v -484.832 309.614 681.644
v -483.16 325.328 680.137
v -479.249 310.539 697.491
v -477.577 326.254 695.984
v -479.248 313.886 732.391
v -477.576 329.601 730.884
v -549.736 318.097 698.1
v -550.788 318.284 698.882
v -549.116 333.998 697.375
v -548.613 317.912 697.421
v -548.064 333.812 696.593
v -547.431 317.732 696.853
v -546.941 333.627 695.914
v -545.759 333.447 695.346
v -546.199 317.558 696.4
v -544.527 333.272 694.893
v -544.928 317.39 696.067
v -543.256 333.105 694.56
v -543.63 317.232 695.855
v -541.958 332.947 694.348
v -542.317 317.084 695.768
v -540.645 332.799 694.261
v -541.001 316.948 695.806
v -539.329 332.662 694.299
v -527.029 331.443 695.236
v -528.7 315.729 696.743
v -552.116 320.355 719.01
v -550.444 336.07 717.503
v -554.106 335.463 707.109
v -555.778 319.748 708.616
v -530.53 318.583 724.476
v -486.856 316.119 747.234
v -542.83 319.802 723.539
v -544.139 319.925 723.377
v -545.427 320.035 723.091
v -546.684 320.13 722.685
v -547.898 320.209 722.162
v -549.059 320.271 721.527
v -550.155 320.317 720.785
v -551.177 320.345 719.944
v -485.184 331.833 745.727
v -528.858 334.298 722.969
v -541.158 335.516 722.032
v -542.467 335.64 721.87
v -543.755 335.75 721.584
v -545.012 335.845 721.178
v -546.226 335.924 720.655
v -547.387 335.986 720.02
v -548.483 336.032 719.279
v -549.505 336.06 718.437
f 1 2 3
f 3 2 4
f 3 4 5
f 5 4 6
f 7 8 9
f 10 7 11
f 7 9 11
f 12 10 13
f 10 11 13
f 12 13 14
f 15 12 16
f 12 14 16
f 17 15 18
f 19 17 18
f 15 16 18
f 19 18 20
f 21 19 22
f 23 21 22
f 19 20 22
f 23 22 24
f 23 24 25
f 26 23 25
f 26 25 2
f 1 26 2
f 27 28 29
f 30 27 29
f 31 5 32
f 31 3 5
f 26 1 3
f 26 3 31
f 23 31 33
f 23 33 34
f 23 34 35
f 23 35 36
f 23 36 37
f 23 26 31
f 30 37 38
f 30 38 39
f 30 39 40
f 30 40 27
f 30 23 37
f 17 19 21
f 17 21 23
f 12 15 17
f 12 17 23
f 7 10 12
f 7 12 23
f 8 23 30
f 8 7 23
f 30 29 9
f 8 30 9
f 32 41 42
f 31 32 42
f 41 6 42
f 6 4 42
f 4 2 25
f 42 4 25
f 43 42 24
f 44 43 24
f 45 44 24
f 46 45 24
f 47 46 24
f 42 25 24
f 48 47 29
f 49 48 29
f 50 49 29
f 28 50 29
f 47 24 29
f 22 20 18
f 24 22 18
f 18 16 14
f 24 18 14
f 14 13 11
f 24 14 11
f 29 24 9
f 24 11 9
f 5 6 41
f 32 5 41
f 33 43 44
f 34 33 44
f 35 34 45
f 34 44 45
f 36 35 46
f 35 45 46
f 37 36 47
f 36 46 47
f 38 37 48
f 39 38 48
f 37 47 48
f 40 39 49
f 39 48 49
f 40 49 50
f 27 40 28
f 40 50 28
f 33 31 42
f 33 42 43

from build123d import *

# Parameters (mm, degrees)
BASE_BODY_DEPTH      = 7.9375
BASE_BODY_DEPTH_BACK = 7.9375


with BuildPart() as part:
    # Sketch36 → base body (new, two sides: drawn at the far end of the back side and taken through both)
    with BuildSketch(Plane(origin=(20.921737804, 196.649439362, -18.857828861), x_dir=(-0.9944387813726006, 0.10483531003395151, -0.010053251825273378), z_dir=(-0.10531623854931917, -0.9898976586232768, 0.09492689476632808)).offset(-BASE_BODY_DEPTH_BACK)):
        with BuildLine():
            Line((502.126358952, -759.009489392), (509.776945736, -773.997260344))
            Line((509.776945736, -773.997260344), (553.695188941, -751.57896131))
            Line((553.695188941, -751.57896131), (566.064134599, -750.762637468))
            ThreePointArc((566.064134599, -750.762637468), (571.160491163, -749.431075239), (575.401507546, -746.307025266))
            Line((575.401507546, -746.307025266), (579.083820389, -735.902974553))
            Line((579.083820389, -735.902974553), (574.066112376, -726.073106528))
            ThreePointArc((574.066112376, -726.073106528), (569.451308261, -723.533521683), (564.224157475, -722.883288763))
            Line((564.224157475, -722.883288763), (551.855211817, -723.699612605))
            Line((551.855211817, -723.699612605), (507.741248901, -708.086327289))
            Line((507.741248901, -708.086327289), (502.126762386, -723.949564583))
            Line((502.126762386, -723.949564583), (502.126358952, -759.009489392))
        make_face()
    extrude(amount=BASE_BODY_DEPTH + BASE_BODY_DEPTH_BACK)


solid = part.part
